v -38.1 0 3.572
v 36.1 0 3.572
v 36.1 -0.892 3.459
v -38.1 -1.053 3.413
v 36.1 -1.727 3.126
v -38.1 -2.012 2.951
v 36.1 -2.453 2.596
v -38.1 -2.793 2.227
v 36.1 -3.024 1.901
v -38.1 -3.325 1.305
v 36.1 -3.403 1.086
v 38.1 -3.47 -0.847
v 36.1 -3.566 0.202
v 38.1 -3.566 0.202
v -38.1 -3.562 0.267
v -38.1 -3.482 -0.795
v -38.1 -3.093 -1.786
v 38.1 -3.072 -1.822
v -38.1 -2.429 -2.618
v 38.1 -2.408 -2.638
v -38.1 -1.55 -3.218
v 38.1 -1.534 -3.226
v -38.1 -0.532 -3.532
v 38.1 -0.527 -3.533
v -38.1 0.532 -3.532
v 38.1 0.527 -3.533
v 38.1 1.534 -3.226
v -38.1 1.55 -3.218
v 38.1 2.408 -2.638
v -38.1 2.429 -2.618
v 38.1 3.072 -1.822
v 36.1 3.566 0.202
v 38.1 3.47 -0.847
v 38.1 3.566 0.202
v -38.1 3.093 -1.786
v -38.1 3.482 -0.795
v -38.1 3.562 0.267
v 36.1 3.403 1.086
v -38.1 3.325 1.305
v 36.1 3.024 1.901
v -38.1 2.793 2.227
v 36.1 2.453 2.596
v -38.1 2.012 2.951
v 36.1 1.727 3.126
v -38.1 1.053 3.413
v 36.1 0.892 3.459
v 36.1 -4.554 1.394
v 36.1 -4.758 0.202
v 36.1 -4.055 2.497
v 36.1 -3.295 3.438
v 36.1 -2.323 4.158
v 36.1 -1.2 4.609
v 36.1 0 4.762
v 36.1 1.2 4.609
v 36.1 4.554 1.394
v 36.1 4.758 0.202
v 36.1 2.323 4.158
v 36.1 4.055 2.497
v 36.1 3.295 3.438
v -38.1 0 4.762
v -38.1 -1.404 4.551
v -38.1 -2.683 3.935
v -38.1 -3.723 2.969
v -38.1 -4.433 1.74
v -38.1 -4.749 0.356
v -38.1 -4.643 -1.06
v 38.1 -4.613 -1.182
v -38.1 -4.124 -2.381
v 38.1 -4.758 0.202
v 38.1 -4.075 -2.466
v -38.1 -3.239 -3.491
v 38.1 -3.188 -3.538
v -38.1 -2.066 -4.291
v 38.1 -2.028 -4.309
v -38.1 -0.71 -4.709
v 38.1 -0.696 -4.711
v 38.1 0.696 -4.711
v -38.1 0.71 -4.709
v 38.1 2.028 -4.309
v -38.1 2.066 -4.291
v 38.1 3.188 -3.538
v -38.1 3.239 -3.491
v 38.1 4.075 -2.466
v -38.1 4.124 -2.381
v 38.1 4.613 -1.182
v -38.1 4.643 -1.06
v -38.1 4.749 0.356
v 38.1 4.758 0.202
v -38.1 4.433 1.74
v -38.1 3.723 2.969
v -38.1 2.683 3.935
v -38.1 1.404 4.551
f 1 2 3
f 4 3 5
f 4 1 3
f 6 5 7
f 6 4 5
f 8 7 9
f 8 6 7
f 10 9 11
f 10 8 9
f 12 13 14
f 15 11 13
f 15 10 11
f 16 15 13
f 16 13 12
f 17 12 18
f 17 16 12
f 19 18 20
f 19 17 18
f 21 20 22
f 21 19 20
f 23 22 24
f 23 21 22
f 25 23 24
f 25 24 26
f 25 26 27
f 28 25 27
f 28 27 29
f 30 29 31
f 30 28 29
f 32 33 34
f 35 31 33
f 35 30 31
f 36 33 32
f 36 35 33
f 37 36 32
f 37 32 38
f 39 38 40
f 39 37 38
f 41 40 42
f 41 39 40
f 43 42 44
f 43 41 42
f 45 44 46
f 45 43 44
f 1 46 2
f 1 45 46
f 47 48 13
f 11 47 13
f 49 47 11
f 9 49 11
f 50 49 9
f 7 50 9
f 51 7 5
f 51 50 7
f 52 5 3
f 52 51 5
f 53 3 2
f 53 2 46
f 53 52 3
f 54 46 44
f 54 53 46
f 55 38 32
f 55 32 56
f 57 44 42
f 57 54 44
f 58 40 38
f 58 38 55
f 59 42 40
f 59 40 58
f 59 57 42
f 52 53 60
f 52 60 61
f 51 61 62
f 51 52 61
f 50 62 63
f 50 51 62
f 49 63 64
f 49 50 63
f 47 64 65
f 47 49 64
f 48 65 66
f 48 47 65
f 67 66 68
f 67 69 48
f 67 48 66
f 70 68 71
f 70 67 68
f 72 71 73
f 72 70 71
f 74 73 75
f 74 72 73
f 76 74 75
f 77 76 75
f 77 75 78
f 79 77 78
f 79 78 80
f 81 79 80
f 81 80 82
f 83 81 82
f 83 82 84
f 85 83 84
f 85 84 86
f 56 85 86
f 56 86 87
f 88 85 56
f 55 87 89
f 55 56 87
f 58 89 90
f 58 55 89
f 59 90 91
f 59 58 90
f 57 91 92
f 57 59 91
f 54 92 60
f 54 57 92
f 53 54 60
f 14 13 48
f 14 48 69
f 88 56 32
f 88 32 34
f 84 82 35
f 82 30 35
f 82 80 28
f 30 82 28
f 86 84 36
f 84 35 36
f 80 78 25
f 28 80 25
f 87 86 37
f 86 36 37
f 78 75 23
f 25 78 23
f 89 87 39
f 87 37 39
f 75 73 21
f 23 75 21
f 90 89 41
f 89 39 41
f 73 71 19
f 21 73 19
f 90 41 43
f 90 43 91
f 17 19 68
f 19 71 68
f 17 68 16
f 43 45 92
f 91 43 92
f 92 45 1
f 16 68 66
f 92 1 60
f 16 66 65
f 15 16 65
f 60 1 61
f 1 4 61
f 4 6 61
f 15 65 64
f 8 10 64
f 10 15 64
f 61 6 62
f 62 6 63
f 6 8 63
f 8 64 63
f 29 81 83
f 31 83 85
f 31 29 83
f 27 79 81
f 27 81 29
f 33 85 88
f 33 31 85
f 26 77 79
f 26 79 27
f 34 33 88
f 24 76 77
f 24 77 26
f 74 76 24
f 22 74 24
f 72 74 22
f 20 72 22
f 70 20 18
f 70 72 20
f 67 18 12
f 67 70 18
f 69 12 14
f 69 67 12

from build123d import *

# Parameters (mm, degrees)
SKETCH3_R           = 4.7625
SKETCH3_R_2         = 3.571875
BOSS_EXTRUDE1_DEPTH = 38.1
SKETCH4_W           = 4
SKETCH4_H           = 11.464180208
CUT_EXTRUDE1_DEPTH  = 34.798


with BuildPart() as part:
    # Sketch3 → Boss-Extrude1 (new, symmetric)
    with BuildSketch(Plane(origin=(0, 0, 0), x_dir=(0, 0, -1), z_dir=(1, 0, 0))):
        with Locations(Location((0, 0, 0), (0, 0, 180))):
            Circle(SKETCH3_R)
        with Locations(Location((0, 0, 0), (0, 0, 180))):
            Circle(SKETCH3_R_2, mode=Mode.SUBTRACT)
    extrude(amount=BOSS_EXTRUDE1_DEPTH, both=True)

    # Sketch4 → Cut-Extrude1 (cut)
    with BuildSketch(Plane.XY.offset(35)):
        with Locations((38.1, 0)):
            Rectangle(SKETCH4_W, SKETCH4_H)
    extrude(amount=-CUT_EXTRUDE1_DEPTH, mode=Mode.SUBTRACT)


solid = part.part
